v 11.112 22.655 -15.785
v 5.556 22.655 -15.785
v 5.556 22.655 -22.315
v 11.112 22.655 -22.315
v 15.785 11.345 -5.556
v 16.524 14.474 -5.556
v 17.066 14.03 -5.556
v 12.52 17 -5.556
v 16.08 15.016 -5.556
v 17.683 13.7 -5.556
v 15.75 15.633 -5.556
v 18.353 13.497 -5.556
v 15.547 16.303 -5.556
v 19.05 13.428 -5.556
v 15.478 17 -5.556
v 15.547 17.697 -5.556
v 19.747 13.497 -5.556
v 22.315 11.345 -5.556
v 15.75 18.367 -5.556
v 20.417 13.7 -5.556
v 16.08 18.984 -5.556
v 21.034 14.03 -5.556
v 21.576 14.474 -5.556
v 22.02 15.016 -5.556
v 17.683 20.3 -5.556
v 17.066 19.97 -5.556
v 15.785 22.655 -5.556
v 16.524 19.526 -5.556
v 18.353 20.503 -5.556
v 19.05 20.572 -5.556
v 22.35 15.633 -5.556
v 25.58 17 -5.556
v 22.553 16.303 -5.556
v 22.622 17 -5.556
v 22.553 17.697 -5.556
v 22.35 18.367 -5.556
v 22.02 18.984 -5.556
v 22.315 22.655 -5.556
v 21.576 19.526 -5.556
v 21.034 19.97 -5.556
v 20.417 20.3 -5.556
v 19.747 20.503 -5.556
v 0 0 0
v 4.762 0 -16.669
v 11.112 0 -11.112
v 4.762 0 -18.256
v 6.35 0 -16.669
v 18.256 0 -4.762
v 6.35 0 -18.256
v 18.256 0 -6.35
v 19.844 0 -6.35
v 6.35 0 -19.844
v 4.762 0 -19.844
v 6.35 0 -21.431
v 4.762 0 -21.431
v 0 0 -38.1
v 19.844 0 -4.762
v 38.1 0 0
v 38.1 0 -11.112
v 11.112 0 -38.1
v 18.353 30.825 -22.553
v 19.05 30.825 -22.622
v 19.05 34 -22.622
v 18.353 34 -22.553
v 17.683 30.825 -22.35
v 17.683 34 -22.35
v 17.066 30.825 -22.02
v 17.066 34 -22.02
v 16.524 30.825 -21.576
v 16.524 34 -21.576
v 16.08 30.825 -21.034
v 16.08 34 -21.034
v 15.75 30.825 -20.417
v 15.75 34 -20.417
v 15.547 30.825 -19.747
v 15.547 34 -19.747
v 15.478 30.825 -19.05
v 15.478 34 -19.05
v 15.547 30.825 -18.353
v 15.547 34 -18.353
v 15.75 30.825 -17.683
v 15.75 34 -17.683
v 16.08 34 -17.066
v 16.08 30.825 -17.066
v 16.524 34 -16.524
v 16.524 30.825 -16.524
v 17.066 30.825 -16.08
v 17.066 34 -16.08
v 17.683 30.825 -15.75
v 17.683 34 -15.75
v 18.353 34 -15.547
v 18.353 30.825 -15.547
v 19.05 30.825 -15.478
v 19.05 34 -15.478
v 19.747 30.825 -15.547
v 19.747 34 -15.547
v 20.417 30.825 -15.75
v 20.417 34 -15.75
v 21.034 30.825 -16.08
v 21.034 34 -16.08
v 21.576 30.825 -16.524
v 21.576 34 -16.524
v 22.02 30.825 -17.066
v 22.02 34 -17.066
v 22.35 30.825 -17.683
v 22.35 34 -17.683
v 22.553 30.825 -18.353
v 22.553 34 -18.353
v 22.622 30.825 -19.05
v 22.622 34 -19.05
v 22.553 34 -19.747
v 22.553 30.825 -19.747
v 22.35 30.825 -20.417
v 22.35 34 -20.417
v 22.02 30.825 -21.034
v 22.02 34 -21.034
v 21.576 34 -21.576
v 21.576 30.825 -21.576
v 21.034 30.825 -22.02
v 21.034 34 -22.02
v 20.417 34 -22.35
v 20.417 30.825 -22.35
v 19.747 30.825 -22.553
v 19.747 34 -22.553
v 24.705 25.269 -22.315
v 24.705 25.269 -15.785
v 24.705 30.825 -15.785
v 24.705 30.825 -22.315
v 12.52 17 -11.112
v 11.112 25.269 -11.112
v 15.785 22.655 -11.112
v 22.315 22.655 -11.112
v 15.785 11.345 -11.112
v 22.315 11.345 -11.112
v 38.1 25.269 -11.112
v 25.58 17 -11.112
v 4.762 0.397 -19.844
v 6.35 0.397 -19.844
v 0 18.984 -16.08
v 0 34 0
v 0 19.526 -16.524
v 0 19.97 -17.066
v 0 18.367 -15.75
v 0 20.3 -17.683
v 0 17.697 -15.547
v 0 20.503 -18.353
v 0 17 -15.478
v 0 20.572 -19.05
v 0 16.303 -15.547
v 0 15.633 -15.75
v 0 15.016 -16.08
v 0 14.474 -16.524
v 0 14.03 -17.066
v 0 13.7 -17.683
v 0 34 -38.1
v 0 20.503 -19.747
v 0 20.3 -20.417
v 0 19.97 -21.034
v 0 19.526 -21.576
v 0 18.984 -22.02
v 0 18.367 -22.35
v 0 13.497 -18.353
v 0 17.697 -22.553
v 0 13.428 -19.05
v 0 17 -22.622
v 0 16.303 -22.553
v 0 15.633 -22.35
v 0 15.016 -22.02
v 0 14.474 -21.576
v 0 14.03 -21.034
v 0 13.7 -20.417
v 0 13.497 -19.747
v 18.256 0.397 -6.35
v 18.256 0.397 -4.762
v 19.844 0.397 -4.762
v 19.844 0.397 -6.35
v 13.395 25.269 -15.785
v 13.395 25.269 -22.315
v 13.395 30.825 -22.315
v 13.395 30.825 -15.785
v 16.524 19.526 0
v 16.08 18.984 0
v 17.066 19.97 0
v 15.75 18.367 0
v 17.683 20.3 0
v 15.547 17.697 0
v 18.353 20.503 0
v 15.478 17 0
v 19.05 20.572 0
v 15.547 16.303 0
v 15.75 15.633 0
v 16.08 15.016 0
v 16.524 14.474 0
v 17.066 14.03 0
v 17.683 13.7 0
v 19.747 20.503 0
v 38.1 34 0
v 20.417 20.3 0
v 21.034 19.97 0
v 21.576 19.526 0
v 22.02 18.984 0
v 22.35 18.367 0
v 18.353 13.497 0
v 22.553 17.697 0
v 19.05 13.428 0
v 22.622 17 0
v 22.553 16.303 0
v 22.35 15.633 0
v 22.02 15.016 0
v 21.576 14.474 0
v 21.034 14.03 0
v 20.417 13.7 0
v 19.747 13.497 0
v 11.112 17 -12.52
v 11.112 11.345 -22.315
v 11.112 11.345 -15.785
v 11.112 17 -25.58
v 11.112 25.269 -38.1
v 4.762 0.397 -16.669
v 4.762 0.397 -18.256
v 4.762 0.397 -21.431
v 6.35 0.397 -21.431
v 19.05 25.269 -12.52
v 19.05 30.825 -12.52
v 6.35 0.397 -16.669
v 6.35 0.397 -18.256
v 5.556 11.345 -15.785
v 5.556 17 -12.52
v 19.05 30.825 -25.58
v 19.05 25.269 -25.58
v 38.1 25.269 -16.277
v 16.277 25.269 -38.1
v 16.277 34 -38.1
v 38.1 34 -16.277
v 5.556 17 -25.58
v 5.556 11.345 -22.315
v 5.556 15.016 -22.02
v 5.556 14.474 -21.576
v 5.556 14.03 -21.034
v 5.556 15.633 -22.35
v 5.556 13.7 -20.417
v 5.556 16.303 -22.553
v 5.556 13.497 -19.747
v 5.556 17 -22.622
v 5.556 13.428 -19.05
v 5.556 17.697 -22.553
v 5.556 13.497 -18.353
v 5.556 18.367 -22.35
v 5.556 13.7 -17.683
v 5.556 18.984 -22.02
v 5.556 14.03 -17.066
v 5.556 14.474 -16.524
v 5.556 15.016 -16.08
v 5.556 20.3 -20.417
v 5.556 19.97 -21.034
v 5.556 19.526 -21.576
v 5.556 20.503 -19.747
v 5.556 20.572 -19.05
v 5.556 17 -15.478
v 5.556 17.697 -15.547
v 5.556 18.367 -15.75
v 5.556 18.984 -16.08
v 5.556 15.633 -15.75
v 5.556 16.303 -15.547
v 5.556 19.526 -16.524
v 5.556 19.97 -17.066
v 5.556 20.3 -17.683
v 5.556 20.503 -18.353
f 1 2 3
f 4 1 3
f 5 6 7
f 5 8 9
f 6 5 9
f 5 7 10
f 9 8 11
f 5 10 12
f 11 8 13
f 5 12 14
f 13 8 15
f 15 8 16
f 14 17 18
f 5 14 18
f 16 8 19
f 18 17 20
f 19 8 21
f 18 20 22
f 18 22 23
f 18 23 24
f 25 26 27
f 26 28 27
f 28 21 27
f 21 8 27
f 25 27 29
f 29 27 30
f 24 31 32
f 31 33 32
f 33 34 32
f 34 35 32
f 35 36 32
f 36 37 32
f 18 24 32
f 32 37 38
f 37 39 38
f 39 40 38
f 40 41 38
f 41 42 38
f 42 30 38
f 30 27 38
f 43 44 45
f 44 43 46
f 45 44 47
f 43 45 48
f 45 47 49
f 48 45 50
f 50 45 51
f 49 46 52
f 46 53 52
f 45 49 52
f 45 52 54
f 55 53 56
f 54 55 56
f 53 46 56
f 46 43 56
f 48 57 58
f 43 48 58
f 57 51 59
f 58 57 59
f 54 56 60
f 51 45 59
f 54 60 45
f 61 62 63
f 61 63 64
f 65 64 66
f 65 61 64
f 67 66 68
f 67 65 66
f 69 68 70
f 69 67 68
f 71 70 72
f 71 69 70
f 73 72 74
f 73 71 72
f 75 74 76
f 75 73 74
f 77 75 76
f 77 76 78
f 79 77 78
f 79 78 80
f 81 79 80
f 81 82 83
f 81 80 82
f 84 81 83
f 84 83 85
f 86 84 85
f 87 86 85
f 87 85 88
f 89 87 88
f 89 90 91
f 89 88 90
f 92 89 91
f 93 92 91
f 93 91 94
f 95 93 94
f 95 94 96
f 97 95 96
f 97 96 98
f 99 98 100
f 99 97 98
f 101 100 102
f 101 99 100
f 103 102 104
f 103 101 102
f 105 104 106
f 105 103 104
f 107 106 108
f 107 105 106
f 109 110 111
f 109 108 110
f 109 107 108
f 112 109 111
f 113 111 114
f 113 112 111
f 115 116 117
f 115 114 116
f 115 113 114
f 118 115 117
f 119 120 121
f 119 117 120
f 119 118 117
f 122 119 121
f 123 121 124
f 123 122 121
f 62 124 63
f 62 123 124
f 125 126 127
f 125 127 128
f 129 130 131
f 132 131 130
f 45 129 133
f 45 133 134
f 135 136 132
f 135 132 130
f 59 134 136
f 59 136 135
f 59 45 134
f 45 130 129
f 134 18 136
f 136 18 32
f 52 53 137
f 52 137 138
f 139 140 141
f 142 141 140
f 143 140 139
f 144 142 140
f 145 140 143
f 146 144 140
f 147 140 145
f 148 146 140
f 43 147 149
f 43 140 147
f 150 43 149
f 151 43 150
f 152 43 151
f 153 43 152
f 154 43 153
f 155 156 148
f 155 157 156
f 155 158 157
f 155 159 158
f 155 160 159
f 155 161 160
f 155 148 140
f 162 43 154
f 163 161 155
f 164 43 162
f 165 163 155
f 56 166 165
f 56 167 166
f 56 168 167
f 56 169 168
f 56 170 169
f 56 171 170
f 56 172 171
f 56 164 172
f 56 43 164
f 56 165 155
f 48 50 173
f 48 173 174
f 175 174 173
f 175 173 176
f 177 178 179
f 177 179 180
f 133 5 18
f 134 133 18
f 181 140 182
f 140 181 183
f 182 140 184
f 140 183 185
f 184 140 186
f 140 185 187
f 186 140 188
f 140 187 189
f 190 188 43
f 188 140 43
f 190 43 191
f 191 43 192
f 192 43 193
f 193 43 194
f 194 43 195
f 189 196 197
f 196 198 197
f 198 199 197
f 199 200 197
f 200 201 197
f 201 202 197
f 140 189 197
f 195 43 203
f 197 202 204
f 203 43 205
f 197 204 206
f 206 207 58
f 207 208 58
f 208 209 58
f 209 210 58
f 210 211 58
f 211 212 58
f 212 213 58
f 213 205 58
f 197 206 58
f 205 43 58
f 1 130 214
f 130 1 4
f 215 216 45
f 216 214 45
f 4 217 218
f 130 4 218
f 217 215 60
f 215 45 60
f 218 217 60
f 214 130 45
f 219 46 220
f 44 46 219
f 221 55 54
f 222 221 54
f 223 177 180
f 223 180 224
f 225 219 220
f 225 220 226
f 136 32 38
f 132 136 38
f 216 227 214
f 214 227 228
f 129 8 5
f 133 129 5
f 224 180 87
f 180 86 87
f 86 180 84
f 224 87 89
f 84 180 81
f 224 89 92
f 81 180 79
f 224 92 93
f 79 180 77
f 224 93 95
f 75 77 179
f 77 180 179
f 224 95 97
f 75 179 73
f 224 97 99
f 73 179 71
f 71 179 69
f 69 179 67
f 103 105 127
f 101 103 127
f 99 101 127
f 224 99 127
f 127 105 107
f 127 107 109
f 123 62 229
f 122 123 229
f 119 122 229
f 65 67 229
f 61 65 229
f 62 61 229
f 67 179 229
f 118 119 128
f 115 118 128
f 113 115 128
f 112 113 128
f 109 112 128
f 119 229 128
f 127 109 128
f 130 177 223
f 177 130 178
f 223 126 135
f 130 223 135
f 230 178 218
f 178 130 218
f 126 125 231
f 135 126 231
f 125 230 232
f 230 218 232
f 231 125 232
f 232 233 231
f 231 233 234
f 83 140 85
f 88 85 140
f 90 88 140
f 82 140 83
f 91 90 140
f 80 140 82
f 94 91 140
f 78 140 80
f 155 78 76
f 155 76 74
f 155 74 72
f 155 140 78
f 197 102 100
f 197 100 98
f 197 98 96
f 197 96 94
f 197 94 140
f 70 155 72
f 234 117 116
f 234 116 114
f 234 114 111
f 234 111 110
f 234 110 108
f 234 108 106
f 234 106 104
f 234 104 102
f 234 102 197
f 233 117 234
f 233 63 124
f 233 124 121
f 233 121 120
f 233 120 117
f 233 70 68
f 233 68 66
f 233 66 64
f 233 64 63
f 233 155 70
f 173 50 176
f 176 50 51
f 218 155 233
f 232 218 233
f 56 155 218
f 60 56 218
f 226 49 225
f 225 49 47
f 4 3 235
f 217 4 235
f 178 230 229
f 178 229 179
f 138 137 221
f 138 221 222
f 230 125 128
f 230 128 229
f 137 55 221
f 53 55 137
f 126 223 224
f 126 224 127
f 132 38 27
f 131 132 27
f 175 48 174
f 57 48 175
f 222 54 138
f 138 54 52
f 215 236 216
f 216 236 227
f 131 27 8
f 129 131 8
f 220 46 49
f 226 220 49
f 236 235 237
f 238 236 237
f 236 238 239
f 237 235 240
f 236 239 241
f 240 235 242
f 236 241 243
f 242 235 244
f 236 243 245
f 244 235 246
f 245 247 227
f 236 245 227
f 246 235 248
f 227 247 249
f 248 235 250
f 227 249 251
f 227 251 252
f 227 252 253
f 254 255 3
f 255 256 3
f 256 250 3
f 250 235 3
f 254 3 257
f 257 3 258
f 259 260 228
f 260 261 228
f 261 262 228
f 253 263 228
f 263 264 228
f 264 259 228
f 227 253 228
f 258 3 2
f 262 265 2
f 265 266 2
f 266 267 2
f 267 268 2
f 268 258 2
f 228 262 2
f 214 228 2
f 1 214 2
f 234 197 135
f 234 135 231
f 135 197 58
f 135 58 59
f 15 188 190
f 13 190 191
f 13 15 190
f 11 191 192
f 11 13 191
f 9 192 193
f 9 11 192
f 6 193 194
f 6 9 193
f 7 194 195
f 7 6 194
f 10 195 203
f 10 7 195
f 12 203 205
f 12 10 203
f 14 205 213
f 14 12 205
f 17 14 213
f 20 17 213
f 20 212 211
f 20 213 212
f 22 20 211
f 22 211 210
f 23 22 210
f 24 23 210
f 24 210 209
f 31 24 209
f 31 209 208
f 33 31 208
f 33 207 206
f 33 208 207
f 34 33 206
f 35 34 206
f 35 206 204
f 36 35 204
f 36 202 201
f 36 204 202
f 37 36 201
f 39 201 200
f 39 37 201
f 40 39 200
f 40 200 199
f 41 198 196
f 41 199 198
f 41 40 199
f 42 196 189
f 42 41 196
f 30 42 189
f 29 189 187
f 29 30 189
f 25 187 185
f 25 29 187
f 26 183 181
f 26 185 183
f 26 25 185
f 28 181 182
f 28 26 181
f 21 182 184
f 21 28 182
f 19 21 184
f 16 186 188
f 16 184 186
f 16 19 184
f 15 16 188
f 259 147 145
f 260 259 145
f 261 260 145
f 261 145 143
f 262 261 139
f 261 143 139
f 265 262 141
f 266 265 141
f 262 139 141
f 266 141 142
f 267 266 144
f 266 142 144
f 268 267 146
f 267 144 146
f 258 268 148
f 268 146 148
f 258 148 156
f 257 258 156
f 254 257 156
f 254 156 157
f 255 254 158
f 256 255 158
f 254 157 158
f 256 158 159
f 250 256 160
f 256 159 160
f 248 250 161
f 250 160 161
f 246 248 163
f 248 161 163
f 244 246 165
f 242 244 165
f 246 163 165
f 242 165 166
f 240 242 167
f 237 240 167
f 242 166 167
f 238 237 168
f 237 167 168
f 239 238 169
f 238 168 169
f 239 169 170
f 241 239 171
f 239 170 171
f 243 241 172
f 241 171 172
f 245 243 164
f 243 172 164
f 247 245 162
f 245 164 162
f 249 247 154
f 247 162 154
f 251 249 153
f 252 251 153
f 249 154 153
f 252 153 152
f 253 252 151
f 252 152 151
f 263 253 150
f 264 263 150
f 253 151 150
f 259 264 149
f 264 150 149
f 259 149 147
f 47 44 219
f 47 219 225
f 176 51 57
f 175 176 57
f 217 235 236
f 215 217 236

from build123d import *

# Parameters (mm, degrees)
SKETCH1_W                    = 38.1
SKETCH1_H                    = 38.1
MAIN_BODY_DEPTH              = 34
F_9_32_RIGHT_RAIL_DEPTH      = 64.712008287
F_9_32_RIGHT_RAIL_DEPTH_BACK = 5.55625
SKETCH3_R                    = 3.571875
SKETCH4_R                    = 3.571875
F_9_32_LEFT_RAIL_DEPTH       = 5.55625
F_9_32_TOPPER_DEPTH          = 64.712008287
F_9_32_TOPPER_DEPTH_BACK     = 10
SKETCH8_R                    = 3.571875
HEX_START                    = -5.55625
HEX_HOLE_RIGHT_DEPTH         = 32.54375
HEX_HOLE_LEFT_DEPTH          = 32.54375
INNER_START                  = -34
INNER_CAVITY_OUTLINE_W       = 26.9875
INNER_CAVITY_OUTLINE_H       = 26.9875
INNER_CAVITY_DEPTH           = 25.26875
HEX_START_2                  = -17
HEX_HOLE_TOP_DEPTH           = 13.825
TOP_CORNER_REACH             = 65.712
SKETCH17_W                   = 1.5875
SKETCH17_H                   = 1.5875
CUT_EXTRUDE1_DEPTH           = 0.396875


# Read off the part's stored shape, not the designer's step: Inner Cavity
with BuildPart() as part:
    # Sketch1 → Main Body (new body)
    with BuildSketch(Plane(origin=(0, 0, 0), x_dir=(1, 0, 0), z_dir=(0, 1, 0))):
        with Locations((19.05, 19.05)):
            Rectangle(SKETCH1_W, SKETCH1_H)
    extrude(amount=MAIN_BODY_DEPTH)

    # Sketch3 → 9/32 Right Rail (cut, two sides: drawn at the far end of the back side and taken through both)
    with BuildSketch(Plane.XY.offset(-F_9_32_RIGHT_RAIL_DEPTH_BACK)):
        with Locations(Location((19.05, 17, 0), (0, 0, 180))):
            Circle(SKETCH3_R)
    extrude(amount=F_9_32_RIGHT_RAIL_DEPTH + F_9_32_RIGHT_RAIL_DEPTH_BACK, mode=Mode.SUBTRACT)

    # Sketch4 → 9/32 Left Rail (cut)
    with BuildSketch(Plane.ZY):
        with Locations((-19.05, 17)):
            Circle(SKETCH4_R)
    extrude(amount=-F_9_32_LEFT_RAIL_DEPTH, mode=Mode.SUBTRACT)

    # Sketch8 → 9/32 Topper (cut, two sides: drawn at the far end of the back side and taken through both)
    with BuildSketch(Plane(origin=(0, 34, 0), x_dir=(1, 0, 0), z_dir=(0, 1, 0)).offset(-F_9_32_TOPPER_DEPTH_BACK)):
        with Locations(Location((19.05, 19.05, 0), (0, 0, 90))):
            Circle(SKETCH8_R)
    extrude(amount=F_9_32_TOPPER_DEPTH + F_9_32_TOPPER_DEPTH_BACK, mode=Mode.SUBTRACT)

    # Sketch9 → Hex Hole Right (cut)
    with BuildSketch(Plane.ZY.offset(HEX_START)):
        Polygon((-22.315182739, 22.6554624), (-25.580365478, 17), (-22.315182739, 11.3445376), (-15.784817261, 11.3445376), (-12.519634522, 17), (-15.784817261, 22.6554624), align=None)
    extrude(amount=-HEX_HOLE_RIGHT_DEPTH, mode=Mode.SUBTRACT)

    # Sketch10 → Hex Hole Left (cut)
    with BuildSketch(Plane.XY.offset(HEX_START)):
        Polygon((15.784813595, 22.65546875), (12.51962719, 17), (15.784813595, 11.34453125), (22.315186405, 11.34453125), (25.58037281, 17), (22.315186405, 22.65546875), align=None)
    extrude(amount=-HEX_HOLE_LEFT_DEPTH, mode=Mode.SUBTRACT)

    # Inner Cavity outline → Inner Cavity (cut)
    with BuildSketch(Plane(origin=(0, 34, 0), x_dir=(1, 0, 0), z_dir=(0, 1, 0)).offset(INNER_START)):
        with Locations((24.60625, 24.60625)):
            Rectangle(INNER_CAVITY_OUTLINE_W, INNER_CAVITY_OUTLINE_H)
    extrude(amount=INNER_CAVITY_DEPTH, mode=Mode.SUBTRACT)

    # Sketch14 → Hex Hole Top (cut)
    with BuildSketch(Plane(origin=(0, 34, 0), x_dir=(1, 0, 0), z_dir=(0, 1, 0)).offset(HEX_START_2)):
        Polygon((24.70546875, 22.315186405), (19.05, 25.58037281), (13.39453125, 22.315186405), (13.39453125, 15.784813595), (19.05, 12.51962719), (24.70546875, 15.784813595), align=None)
    extrude(amount=HEX_HOLE_TOP_DEPTH, mode=Mode.SUBTRACT)

    # Sketch16 → Top Corner (cut, up to next)
    with BuildSketch(Plane(origin=(0, 34, 0), x_dir=(1, 0, 0), z_dir=(0, 1, 0)), mode=Mode.PRIVATE) as top_corner_sk1:
        Polygon((38.1, 38.1), (16.276714219, 38.1), (38.1, 16.276714219), align=None)
    top_corner_tool1 = extrude(top_corner_sk1.sketch, amount=-TOP_CORNER_REACH, mode=Mode.PRIVATE) & part.part
    add(top_corner_tool1.solids().sort_by_distance((30.825571, 34, -30.825571))[0], mode=Mode.SUBTRACT)

    # Sketch17 → Cut-Extrude1 (cut)
    with BuildSketch(Plane.XZ):
        with Locations((19.05, -5.55625)):
            Rectangle(SKETCH17_W, SKETCH17_H)
        with Locations((5.55625, -17.4625)):
            Rectangle(SKETCH17_W, SKETCH17_H)
        with Locations((5.55625, -20.6375)):
            Rectangle(SKETCH17_W, SKETCH17_H)
    extrude(amount=-CUT_EXTRUDE1_DEPTH, mode=Mode.SUBTRACT)


solid = part.part
